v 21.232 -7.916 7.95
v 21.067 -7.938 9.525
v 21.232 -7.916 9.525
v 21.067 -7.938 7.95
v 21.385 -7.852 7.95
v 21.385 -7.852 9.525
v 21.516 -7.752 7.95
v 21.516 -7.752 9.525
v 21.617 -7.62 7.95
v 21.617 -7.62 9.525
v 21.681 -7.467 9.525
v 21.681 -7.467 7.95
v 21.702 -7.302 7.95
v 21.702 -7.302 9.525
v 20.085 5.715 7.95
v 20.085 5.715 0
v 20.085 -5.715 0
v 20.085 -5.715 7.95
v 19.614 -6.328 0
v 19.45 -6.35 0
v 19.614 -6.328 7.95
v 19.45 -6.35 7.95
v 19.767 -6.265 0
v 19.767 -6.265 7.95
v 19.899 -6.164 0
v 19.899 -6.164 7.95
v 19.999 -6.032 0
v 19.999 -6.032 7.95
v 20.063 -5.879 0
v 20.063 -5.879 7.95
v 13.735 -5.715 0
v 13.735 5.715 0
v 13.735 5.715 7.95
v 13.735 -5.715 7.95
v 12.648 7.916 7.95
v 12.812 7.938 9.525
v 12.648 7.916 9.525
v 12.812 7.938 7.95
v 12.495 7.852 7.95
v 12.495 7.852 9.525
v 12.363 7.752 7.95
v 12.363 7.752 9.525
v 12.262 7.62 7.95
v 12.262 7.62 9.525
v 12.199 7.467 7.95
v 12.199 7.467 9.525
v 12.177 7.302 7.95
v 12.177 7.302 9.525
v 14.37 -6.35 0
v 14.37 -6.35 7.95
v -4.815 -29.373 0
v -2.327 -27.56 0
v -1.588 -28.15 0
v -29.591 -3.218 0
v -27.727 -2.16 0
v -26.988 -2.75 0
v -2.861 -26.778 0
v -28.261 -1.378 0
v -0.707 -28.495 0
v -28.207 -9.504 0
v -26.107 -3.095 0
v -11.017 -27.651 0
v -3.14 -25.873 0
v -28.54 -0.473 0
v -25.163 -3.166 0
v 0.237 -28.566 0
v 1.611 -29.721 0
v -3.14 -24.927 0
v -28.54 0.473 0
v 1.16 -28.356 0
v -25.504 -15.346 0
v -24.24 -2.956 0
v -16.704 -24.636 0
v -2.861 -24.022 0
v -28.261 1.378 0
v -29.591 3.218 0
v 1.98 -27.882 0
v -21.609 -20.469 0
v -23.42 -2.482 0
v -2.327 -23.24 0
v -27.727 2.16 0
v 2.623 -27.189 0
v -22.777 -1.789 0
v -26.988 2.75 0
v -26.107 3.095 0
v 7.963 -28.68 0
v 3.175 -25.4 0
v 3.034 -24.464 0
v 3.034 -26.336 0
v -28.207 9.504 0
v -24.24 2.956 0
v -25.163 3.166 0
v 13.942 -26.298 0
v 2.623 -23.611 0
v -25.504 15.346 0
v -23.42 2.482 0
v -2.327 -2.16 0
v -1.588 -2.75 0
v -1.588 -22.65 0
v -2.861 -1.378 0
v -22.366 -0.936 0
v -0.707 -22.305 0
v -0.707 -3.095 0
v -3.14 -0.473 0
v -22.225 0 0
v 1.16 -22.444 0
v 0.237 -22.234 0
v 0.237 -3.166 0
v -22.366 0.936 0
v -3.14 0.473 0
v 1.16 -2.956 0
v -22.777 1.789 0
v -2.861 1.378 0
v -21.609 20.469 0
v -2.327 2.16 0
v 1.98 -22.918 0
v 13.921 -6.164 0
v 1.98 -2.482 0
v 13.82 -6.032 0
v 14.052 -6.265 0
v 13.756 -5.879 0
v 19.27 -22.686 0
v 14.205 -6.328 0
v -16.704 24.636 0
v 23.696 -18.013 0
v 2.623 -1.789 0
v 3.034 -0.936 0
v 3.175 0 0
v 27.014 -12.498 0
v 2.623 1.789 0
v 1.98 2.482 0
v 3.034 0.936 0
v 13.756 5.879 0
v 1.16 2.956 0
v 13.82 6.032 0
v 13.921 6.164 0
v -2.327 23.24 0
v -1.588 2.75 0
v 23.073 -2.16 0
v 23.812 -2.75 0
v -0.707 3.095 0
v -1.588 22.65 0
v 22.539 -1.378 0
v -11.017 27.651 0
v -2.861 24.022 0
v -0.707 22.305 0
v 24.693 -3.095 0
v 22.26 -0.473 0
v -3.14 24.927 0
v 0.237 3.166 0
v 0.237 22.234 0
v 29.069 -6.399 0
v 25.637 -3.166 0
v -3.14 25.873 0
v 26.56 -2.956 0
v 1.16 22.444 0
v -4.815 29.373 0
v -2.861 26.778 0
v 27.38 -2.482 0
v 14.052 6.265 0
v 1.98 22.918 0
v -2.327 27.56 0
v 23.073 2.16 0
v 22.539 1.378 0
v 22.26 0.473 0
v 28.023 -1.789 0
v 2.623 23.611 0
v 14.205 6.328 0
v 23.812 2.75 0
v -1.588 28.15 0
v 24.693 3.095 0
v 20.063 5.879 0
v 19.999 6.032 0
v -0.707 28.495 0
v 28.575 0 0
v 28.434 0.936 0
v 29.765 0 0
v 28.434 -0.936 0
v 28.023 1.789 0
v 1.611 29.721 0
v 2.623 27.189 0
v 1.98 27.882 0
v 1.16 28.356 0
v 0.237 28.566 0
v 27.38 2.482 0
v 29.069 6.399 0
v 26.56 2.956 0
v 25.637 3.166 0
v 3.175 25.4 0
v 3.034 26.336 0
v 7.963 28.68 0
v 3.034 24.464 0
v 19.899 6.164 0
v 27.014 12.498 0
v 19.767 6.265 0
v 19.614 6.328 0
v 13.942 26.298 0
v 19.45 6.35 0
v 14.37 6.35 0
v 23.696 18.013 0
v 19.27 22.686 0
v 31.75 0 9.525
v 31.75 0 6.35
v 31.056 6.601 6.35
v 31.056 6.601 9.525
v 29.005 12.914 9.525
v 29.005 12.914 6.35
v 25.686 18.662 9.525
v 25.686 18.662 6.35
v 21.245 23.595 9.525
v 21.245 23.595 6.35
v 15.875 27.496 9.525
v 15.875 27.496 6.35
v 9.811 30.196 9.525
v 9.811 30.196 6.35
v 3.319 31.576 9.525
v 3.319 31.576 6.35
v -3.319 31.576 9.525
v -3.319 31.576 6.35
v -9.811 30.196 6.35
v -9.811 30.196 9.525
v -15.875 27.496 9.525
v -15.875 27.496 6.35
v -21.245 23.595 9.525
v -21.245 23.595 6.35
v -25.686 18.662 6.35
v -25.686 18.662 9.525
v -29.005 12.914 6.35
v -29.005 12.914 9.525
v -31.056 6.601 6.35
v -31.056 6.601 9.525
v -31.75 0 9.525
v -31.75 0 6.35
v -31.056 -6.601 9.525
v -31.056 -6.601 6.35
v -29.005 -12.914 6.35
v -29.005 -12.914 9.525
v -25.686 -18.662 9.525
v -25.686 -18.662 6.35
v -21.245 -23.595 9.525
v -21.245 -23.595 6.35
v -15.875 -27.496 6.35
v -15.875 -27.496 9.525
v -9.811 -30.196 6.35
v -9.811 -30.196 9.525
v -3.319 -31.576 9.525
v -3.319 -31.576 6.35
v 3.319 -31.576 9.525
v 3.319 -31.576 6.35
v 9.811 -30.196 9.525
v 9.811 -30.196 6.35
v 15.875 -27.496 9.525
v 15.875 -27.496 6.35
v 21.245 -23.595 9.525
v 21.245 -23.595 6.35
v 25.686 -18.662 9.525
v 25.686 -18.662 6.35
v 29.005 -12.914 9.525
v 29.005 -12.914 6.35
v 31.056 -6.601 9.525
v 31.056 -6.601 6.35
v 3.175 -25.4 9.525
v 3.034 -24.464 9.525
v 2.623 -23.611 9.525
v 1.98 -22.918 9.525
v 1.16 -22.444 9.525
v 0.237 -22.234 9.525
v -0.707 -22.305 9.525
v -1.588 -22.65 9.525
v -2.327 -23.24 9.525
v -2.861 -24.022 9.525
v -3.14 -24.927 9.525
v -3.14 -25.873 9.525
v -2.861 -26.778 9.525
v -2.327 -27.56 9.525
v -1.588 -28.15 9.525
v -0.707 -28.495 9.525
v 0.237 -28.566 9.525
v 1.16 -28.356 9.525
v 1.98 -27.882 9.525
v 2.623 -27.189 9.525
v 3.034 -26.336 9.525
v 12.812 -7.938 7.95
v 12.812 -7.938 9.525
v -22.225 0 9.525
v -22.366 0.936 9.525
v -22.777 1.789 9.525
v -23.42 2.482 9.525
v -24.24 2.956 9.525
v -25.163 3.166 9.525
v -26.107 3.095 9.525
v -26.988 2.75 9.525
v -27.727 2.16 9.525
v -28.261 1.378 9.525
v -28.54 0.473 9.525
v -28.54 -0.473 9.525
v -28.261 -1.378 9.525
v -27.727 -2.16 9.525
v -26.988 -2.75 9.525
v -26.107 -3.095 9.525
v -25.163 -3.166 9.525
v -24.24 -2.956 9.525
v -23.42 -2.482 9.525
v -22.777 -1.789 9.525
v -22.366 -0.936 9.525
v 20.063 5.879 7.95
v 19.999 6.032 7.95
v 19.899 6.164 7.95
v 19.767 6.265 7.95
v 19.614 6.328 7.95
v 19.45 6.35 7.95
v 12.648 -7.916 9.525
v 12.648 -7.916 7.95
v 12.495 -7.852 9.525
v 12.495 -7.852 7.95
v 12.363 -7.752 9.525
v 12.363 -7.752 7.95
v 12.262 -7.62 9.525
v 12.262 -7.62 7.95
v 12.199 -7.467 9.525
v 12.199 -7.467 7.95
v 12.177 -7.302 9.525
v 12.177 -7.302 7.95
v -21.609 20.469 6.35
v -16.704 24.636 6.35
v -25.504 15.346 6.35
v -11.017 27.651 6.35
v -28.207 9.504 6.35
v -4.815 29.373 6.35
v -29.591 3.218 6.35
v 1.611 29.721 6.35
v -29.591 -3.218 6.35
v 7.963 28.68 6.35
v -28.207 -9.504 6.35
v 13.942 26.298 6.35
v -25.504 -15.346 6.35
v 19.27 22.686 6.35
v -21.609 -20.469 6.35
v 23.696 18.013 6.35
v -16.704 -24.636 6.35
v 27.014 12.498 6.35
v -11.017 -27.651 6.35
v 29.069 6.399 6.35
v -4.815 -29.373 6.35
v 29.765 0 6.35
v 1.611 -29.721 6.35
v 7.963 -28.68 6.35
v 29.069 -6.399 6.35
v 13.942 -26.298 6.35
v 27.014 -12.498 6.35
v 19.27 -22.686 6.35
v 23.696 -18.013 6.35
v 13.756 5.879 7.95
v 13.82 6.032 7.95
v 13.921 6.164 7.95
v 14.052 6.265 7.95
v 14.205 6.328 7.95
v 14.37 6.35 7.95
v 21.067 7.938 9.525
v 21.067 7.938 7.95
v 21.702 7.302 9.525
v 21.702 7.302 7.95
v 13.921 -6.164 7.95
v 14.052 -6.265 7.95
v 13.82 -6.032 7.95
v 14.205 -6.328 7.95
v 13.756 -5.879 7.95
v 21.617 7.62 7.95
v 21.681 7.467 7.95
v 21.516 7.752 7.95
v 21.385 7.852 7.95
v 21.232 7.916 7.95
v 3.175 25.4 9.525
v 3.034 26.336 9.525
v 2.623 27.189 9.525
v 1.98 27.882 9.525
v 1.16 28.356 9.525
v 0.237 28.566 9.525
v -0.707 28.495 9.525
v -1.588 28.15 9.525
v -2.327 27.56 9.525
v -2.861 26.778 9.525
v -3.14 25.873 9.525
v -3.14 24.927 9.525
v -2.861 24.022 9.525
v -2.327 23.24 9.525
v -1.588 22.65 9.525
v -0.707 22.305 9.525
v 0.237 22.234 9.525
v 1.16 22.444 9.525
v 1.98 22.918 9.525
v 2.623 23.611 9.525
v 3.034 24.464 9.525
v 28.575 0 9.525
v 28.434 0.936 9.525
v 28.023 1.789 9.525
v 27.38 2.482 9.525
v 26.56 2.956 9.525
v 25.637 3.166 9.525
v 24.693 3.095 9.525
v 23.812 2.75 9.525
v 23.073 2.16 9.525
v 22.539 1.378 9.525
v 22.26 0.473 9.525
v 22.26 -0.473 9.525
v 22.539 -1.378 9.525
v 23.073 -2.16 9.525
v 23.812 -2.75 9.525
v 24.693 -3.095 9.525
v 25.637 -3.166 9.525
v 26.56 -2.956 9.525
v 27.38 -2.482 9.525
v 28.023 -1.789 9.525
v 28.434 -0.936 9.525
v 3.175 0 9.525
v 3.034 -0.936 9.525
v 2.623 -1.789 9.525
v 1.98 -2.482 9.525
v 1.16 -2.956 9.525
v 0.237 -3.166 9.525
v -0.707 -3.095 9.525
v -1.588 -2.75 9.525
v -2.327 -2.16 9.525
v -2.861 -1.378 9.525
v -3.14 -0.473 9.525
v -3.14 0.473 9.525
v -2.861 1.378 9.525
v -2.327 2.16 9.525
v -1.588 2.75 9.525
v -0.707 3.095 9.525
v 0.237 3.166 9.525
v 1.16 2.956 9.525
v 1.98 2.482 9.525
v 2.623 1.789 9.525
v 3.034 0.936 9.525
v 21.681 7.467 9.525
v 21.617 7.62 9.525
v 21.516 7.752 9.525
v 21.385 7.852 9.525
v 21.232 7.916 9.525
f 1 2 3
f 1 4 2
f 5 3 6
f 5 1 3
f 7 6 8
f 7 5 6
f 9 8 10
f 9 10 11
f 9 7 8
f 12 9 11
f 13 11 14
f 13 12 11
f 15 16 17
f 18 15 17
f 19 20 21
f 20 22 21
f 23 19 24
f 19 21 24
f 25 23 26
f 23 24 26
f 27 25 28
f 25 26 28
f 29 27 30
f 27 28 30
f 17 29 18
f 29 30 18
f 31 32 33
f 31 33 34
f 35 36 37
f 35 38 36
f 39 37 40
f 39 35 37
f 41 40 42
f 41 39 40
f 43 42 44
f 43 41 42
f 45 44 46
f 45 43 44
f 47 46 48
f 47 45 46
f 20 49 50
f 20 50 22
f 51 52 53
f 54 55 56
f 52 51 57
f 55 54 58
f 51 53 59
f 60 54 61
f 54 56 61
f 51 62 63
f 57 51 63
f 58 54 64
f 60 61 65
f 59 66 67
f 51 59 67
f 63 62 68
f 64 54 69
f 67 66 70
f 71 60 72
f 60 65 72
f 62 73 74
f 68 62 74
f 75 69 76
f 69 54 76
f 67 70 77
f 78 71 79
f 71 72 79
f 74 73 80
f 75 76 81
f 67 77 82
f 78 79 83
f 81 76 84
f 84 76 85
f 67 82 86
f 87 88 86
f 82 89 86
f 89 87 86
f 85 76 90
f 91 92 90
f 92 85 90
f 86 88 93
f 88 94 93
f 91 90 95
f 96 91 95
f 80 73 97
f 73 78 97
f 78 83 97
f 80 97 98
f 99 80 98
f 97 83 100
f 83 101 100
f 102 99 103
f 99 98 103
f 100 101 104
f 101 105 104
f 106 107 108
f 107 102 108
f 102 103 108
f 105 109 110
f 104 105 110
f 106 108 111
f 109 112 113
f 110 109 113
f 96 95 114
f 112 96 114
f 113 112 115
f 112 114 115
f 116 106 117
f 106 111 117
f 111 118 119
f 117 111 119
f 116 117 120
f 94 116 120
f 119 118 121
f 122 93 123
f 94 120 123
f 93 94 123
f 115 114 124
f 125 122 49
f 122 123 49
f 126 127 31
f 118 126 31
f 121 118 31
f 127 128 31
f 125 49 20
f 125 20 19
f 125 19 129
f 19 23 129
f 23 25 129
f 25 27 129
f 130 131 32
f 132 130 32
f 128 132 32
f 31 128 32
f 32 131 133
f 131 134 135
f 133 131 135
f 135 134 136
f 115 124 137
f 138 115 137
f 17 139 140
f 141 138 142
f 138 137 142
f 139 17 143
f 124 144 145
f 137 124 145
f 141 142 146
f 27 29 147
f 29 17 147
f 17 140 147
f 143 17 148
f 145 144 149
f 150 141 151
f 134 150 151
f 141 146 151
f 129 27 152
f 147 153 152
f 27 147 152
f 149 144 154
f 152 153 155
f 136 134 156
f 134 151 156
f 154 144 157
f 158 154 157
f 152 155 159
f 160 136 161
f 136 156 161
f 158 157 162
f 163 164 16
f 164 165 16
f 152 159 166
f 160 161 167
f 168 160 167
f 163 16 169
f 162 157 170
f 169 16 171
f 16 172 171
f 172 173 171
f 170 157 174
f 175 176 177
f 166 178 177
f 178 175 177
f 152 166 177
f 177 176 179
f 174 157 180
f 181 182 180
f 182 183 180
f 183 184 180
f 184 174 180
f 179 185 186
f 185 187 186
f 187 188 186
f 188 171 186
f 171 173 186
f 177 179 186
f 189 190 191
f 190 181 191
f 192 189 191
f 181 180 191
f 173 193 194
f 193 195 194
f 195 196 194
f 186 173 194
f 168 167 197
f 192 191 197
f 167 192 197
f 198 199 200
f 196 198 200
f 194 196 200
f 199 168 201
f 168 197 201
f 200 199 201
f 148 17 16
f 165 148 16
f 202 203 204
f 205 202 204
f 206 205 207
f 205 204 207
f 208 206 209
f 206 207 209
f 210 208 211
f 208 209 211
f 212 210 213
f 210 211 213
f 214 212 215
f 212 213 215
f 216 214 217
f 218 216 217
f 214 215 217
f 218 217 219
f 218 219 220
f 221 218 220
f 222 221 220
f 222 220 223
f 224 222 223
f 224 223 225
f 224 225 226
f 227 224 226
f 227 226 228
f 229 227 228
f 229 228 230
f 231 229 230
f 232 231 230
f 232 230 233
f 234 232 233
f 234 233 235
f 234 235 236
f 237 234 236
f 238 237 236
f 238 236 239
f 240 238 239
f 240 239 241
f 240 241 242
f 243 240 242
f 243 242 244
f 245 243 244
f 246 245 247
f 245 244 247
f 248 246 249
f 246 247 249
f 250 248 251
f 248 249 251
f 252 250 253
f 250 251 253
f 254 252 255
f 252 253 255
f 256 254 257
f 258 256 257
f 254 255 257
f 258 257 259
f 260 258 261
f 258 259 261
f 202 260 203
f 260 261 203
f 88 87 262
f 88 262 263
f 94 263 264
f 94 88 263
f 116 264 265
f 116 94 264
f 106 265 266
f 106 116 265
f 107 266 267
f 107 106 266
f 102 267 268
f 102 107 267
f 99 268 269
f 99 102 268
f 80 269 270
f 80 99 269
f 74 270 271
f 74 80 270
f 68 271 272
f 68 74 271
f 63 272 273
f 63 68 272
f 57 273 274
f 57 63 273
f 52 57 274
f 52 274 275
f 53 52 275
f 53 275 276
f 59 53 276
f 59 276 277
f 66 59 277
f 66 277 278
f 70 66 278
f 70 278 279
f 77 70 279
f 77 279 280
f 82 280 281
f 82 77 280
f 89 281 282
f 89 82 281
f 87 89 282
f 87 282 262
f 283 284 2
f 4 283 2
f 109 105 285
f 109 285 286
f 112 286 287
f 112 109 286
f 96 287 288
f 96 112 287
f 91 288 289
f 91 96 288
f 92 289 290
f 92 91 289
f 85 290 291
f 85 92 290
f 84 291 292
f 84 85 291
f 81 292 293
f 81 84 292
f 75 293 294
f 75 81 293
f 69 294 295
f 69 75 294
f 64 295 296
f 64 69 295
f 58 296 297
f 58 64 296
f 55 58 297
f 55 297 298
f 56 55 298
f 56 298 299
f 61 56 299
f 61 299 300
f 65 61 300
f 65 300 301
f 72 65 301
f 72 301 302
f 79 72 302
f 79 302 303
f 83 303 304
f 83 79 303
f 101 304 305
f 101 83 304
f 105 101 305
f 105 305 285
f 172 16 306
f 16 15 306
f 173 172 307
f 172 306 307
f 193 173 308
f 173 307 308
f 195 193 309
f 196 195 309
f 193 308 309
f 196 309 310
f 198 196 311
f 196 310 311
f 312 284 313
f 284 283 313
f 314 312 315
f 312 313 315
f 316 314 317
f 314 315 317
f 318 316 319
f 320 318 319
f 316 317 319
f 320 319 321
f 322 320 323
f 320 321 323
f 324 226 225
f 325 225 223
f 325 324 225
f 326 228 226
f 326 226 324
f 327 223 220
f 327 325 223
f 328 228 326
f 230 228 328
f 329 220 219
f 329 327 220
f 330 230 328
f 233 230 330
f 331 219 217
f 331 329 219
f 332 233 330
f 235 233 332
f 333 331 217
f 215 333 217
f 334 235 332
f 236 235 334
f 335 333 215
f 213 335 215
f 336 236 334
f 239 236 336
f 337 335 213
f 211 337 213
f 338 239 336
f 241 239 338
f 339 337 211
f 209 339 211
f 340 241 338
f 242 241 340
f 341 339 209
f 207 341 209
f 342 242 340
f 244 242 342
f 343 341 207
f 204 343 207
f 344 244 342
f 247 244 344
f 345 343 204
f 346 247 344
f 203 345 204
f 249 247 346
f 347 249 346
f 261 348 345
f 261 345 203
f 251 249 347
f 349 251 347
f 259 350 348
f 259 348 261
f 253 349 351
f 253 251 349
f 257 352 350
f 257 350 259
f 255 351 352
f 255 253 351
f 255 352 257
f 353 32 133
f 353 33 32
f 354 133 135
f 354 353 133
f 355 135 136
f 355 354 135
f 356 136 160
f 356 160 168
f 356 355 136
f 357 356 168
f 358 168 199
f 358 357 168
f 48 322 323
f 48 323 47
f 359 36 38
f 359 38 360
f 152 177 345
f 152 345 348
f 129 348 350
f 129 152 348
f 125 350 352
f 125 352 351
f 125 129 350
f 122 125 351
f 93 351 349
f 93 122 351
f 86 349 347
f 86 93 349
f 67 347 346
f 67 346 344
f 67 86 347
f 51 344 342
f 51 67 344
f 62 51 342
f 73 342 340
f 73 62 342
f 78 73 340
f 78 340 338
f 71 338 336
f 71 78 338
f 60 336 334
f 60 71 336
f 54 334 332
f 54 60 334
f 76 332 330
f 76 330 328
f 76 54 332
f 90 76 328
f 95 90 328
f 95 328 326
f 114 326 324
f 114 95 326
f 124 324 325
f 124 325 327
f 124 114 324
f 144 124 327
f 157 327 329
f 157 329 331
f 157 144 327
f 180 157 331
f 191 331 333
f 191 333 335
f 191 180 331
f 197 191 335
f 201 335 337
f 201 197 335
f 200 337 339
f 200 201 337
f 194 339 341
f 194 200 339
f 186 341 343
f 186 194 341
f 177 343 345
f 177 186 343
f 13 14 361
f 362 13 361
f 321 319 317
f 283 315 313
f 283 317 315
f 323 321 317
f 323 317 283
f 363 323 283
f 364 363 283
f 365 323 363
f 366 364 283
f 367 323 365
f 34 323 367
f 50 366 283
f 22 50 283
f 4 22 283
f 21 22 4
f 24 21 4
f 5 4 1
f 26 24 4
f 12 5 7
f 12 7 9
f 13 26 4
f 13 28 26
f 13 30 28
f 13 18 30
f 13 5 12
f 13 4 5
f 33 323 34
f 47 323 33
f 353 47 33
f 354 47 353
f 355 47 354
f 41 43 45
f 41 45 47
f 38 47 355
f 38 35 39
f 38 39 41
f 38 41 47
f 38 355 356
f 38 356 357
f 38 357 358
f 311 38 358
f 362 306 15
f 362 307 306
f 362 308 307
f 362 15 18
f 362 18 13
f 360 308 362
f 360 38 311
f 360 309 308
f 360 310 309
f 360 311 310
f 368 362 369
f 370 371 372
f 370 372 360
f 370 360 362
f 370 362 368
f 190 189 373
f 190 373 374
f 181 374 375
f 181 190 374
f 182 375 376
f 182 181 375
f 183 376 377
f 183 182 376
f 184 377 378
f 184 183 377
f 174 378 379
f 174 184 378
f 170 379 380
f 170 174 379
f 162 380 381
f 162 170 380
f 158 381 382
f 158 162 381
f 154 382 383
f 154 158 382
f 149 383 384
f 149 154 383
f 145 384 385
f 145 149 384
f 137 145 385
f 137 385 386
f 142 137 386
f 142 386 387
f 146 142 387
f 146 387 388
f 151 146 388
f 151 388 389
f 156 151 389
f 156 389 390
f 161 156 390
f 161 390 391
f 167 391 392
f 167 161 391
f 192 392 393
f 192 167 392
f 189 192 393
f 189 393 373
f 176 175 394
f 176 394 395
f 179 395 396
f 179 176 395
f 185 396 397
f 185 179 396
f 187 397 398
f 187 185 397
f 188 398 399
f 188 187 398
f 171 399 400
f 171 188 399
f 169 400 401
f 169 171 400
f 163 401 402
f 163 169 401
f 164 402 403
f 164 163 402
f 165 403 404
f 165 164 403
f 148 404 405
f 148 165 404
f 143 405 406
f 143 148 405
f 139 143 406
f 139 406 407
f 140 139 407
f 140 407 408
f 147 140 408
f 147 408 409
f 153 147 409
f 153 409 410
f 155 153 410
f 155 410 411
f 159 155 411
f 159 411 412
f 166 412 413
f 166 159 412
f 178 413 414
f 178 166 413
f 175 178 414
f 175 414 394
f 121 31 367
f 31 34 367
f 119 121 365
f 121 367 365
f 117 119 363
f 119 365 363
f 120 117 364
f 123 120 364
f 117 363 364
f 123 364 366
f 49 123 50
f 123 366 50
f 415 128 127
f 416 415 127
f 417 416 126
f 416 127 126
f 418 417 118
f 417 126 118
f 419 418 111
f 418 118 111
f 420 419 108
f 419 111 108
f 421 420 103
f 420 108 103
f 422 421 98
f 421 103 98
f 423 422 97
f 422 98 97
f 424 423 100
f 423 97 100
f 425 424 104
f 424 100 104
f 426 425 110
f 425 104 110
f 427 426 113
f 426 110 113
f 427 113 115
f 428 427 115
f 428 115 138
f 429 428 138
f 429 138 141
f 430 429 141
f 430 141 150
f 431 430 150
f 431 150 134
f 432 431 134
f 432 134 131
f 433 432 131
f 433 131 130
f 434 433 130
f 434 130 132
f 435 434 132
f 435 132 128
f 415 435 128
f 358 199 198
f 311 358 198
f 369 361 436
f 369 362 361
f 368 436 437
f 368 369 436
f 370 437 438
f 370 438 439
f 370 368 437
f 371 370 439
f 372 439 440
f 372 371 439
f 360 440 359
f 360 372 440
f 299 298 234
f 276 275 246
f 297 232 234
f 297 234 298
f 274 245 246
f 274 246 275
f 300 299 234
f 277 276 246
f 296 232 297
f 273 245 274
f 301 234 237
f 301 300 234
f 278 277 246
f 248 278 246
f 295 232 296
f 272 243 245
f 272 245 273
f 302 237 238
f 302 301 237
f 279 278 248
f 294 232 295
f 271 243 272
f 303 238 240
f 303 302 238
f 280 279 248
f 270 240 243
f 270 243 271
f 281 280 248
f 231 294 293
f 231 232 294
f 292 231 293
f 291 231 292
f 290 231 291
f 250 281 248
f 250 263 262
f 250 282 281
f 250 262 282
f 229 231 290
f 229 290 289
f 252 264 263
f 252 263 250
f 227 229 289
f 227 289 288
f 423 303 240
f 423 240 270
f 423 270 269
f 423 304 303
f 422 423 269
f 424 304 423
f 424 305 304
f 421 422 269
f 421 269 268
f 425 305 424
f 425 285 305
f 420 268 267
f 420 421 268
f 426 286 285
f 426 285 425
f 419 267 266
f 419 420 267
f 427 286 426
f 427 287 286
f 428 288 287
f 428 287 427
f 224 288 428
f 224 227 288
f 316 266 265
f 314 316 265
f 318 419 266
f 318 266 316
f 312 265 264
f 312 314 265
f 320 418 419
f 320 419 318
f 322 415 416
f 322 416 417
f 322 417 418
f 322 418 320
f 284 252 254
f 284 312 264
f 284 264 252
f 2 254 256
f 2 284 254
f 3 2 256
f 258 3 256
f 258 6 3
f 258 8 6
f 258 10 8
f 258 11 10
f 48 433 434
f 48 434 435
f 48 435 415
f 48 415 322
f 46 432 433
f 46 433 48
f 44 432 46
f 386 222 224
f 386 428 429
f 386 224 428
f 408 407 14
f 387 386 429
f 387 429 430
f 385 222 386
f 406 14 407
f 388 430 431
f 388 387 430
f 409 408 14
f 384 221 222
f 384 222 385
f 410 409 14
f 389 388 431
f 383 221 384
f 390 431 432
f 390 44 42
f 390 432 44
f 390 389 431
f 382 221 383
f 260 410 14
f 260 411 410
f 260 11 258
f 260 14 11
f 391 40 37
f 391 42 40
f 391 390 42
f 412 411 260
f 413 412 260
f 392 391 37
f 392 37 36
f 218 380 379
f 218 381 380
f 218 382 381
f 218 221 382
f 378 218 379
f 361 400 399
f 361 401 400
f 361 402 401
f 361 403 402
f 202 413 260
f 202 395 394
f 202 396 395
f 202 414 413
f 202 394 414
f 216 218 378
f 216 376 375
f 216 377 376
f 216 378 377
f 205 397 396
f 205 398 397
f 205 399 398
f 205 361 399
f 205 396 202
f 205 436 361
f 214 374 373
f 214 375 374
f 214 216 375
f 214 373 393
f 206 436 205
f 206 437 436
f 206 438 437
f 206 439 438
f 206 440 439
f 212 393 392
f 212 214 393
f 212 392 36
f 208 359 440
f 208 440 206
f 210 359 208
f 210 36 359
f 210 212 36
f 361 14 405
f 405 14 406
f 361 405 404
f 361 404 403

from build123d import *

# Parameters (mm, degrees)
F0_R     = 31.75
F0_R_2   = 3.175
F1_DEPTH = 9.525
F2_R     = 31.75
F2_R_2   = 29.765094
F3_DEPTH = 6.35
F4_R     = 3.175
F5_DEPTH = 9.526
F6_W     = 6.35
F6_H     = 12.7
F7_DEPTH = 25.4
F8_W     = 9.525
F8_H     = 15.875
F9_DEPTH = 1.5748
F10_R    = 0.635


with BuildPart() as f1:
    # F0 (on Top) → F1 (new body)
    with BuildSketch(Plane.XY):
        Circle(F0_R)
        with Locations((0, -25.4)):
            Circle(F0_R_2, mode=Mode.SUBTRACT)
        with Locations((-25.4, 0)):
            Circle(F0_R_2, mode=Mode.SUBTRACT)
        with Locations((25.4, 0)):
            Circle(F0_R_2, mode=Mode.SUBTRACT)
        with Locations((0, 25.4)):
            Circle(F0_R_2, mode=Mode.SUBTRACT)
    extrude(amount=F1_DEPTH)

    # F2 (on face) → F3 (cut)
    with BuildSketch(Plane(origin=(0, 0, 0), x_dir=(1, 0, 0), z_dir=(0, 0, -1))):
        Circle(F2_R)
        Circle(F2_R_2, mode=Mode.SUBTRACT)
    extrude(amount=-F3_DEPTH, mode=Mode.SUBTRACT)

    # F4 (on face) → F5 (cut, through all)
    with BuildSketch(Plane(origin=(0, 0, 0), x_dir=(1, 0, 0), z_dir=(0, 0, -1))):
        Circle(F4_R)
    extrude(amount=-F5_DEPTH, mode=Mode.SUBTRACT)

    # F6 (on face) → F7 (cut)
    with BuildSketch(Plane(origin=(0, 0, 0), x_dir=(1, 0, 0), z_dir=(0, 0, -1))):
        with Locations((16.909514, 0)):
            Rectangle(F6_W, F6_H)
    extrude(amount=-F7_DEPTH, mode=Mode.SUBTRACT)

    # F8 (on face) → F9 (cut)
    with BuildSketch(Plane.XY.offset(9.525)):
        with Locations((16.939783, 0)):
            Rectangle(F8_W, F8_H)
    extrude(amount=-F9_DEPTH, mode=Mode.SUBTRACT)

    # F10
    f10_edges = [f1.edges().sort_by_distance(p)[0] for p in [
        (13.734514, -6.35, 3.9751),
        (13.734514, 6.35, 3.9751),
        (20.084514, -6.35, 3.9751),
        (20.084514, 6.35, 3.9751),
        (21.702283, 7.9375, 8.7376),
        (21.702283, -7.9375, 8.7376),
        (12.177283, -7.9375, 8.7376),
        (12.177283, 7.9375, 8.7376),
    ]]
    fillet(f10_edges, radius=F10_R)


solid = f1.part
